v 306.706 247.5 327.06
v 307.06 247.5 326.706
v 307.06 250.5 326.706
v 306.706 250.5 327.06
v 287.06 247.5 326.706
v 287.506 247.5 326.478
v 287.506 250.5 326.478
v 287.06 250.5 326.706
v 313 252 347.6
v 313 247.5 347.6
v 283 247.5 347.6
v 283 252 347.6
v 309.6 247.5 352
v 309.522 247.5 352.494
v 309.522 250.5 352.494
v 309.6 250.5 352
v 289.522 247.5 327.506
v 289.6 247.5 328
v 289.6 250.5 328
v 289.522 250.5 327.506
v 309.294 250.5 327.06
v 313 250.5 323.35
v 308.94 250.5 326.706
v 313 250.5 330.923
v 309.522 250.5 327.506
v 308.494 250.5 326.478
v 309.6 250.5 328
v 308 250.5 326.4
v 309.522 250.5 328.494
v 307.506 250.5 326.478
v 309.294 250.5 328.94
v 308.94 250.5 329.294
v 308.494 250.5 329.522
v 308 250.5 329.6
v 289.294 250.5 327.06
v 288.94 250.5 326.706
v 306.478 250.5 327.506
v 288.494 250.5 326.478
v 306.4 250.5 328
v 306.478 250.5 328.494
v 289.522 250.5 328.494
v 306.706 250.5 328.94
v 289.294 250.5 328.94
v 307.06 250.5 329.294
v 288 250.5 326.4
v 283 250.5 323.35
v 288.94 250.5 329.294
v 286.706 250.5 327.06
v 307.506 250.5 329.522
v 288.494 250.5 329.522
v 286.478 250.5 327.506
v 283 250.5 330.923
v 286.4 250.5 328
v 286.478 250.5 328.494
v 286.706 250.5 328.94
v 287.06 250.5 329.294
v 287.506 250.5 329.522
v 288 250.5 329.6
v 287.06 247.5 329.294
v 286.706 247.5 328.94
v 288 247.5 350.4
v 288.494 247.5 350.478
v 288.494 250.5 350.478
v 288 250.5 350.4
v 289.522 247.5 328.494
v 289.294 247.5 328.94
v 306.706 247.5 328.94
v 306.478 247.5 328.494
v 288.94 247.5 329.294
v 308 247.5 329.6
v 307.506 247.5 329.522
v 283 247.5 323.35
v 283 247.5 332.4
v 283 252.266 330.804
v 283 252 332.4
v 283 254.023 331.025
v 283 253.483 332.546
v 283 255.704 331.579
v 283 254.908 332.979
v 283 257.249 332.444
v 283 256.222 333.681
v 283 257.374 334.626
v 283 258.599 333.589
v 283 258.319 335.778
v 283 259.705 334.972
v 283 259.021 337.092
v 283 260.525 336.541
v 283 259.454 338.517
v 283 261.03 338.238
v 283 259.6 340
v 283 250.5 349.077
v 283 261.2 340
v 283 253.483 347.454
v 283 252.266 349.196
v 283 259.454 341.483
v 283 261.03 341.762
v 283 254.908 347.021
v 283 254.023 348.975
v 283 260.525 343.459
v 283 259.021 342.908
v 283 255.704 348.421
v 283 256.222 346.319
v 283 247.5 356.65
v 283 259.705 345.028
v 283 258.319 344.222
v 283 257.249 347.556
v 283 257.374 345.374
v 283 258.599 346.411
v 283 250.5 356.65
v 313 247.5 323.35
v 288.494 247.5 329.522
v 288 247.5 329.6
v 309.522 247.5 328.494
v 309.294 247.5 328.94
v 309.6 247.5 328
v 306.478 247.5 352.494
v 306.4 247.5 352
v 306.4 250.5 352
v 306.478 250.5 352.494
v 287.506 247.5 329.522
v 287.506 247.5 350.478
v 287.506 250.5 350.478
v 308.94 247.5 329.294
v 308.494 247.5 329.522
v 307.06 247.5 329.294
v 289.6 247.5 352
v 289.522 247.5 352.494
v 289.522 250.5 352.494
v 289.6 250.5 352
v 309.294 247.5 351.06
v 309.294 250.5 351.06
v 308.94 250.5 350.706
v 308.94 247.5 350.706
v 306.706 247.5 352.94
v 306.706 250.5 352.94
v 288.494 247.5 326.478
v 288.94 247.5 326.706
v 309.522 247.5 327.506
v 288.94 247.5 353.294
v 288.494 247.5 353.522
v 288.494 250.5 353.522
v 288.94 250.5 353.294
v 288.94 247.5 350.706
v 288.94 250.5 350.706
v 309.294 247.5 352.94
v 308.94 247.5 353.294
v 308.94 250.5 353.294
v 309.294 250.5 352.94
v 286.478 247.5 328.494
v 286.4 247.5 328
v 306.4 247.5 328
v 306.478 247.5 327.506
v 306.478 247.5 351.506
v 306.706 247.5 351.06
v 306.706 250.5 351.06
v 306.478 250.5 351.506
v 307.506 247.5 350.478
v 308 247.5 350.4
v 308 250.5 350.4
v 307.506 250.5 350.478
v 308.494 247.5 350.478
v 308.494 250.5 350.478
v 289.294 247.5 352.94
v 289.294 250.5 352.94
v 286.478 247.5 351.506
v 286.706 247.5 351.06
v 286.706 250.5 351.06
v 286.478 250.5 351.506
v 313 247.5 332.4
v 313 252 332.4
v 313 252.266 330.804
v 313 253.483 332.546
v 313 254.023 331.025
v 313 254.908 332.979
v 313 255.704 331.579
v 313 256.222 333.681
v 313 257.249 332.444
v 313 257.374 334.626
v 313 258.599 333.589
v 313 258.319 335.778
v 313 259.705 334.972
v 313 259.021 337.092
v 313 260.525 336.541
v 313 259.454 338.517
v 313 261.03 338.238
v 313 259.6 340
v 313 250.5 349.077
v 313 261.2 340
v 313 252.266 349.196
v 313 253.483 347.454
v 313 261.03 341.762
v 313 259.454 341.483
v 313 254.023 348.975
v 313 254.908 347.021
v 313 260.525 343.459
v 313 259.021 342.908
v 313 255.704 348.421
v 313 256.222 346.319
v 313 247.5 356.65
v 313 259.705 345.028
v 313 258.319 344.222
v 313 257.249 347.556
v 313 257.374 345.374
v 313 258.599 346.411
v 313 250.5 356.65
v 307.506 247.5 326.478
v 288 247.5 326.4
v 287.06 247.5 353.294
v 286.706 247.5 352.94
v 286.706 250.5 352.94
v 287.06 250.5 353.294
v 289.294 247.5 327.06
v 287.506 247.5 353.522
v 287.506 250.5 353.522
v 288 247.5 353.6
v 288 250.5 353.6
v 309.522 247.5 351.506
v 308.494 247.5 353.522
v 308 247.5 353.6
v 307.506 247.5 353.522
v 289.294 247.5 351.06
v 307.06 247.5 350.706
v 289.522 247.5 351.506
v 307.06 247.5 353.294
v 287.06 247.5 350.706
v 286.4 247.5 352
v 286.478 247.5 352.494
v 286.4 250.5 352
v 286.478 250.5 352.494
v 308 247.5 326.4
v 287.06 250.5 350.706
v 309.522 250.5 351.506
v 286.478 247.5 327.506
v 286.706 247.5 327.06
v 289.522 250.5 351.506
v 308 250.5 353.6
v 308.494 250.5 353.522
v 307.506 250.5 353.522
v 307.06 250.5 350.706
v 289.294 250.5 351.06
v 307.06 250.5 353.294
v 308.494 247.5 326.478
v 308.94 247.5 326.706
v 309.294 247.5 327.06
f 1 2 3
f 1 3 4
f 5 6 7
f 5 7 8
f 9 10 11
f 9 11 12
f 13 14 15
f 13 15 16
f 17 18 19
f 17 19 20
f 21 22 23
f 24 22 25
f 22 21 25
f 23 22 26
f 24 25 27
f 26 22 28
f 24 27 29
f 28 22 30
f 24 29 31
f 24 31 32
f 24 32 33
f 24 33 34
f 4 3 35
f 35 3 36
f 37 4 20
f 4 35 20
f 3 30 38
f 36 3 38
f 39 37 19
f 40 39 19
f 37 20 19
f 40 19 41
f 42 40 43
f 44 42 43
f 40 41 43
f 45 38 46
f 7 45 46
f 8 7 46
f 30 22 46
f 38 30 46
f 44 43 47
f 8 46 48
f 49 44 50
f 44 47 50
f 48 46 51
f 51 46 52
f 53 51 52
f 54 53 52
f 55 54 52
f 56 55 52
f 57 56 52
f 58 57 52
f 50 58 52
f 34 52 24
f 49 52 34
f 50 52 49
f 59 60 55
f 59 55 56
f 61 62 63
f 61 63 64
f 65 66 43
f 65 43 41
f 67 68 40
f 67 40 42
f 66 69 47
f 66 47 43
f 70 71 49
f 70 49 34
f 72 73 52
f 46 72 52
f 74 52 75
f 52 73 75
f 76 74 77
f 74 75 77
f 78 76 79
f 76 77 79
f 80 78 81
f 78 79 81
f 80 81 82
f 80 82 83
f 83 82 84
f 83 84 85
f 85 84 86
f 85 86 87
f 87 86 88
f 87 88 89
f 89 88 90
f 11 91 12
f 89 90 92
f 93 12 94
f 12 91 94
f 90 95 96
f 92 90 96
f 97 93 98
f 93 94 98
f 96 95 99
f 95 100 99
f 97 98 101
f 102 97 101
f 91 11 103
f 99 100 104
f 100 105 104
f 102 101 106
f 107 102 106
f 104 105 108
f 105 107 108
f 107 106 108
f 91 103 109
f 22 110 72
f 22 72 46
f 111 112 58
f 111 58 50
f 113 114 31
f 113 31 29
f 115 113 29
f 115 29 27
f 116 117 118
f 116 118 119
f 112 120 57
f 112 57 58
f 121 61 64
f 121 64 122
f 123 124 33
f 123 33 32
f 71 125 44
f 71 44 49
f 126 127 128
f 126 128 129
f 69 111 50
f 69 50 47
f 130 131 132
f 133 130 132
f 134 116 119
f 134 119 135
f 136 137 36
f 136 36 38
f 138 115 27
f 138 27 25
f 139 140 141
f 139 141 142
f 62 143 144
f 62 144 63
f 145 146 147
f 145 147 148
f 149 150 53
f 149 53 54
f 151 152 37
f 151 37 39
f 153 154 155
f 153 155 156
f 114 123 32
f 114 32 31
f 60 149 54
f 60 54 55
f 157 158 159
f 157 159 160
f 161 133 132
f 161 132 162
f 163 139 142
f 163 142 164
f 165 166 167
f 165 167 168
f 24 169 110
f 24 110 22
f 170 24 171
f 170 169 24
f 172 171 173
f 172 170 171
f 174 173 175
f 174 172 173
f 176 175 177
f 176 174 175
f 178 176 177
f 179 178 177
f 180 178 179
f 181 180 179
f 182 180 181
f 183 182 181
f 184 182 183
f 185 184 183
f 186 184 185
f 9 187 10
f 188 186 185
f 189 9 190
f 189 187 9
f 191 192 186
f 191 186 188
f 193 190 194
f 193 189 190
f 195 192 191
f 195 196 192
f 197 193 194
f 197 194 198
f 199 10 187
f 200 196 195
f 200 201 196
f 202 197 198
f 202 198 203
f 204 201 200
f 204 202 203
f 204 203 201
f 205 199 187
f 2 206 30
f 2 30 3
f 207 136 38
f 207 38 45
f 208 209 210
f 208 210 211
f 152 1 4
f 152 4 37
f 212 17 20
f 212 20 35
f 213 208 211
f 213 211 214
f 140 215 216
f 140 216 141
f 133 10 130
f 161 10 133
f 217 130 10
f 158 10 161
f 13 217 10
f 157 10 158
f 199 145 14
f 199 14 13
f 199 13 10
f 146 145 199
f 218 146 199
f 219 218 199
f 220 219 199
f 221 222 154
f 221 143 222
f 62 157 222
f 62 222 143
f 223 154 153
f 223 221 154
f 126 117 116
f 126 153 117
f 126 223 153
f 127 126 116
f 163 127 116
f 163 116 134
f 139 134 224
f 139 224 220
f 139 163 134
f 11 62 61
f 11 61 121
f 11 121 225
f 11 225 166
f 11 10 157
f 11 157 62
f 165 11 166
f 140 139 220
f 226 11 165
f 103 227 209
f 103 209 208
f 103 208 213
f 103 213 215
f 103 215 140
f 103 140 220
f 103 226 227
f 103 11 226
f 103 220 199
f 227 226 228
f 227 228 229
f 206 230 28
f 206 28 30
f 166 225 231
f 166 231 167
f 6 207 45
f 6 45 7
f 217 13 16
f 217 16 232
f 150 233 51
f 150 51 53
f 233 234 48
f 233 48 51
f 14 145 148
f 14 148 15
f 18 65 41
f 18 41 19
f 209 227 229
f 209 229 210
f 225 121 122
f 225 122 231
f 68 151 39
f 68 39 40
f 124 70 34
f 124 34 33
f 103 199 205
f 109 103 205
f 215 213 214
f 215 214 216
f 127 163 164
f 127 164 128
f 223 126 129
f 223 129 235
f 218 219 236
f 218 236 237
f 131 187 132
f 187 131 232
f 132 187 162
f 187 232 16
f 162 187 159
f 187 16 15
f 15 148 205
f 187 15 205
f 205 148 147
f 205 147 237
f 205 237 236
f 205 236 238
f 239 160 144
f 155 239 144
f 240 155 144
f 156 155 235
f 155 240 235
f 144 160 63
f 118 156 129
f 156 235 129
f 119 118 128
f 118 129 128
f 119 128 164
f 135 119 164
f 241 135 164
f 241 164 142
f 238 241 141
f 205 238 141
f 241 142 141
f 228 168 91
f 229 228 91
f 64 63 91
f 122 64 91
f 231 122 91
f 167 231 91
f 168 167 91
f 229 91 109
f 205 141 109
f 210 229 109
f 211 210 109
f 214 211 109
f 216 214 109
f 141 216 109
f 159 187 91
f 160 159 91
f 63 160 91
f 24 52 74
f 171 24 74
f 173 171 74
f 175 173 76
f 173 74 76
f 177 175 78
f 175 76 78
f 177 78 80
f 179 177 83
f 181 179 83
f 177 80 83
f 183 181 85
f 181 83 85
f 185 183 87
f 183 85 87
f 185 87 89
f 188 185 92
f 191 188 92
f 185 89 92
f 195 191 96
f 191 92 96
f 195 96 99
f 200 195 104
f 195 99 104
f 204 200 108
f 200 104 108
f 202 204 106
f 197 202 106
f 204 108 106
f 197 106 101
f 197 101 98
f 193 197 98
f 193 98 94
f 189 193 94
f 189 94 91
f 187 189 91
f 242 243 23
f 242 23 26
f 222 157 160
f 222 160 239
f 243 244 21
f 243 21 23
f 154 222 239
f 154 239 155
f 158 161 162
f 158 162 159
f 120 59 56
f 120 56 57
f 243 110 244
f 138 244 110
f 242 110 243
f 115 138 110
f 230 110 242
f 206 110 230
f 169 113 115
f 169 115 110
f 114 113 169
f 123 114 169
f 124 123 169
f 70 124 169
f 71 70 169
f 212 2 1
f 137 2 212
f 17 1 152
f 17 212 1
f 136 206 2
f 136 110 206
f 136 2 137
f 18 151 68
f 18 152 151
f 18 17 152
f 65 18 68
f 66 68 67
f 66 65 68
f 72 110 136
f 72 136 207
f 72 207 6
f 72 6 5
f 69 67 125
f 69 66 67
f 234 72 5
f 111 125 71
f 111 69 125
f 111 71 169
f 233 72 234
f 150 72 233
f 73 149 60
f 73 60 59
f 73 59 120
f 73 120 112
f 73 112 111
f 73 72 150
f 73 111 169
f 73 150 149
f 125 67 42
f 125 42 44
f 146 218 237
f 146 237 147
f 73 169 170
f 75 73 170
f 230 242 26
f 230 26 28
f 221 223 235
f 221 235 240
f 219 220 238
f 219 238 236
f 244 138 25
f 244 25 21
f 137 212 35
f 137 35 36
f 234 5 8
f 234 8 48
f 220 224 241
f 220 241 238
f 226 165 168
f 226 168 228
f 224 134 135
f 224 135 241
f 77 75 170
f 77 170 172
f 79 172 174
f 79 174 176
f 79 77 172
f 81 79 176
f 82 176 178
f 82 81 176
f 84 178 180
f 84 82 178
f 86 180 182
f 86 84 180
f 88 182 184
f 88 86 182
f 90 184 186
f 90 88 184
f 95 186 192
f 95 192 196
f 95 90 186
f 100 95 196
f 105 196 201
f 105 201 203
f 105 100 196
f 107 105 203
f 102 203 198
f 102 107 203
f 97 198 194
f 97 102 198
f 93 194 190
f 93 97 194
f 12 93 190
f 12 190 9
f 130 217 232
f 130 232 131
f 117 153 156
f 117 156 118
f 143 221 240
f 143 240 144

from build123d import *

# Parameters (mm, degrees)
PRISM070_DEPTH                = 10
PRISM070_PITCH_ANGLE          = 90
PRISM071_DEPTH                = 10
PRISM071_PITCH_ANGLE          = 90
PRISM072_DEPTH                = 10
PRISM072_PITCH_ANGLE          = 90
PRISM073_DEPTH                = 10
PRISM073_PITCH_ANGLE          = 90
CUBE082_W                     = 5
CUBE082_H                     = 35
CUBE082_DEPTH                 = 32
CUBE081_W                     = 16
CUBE081_H                     = 15.2
CUBE081_DEPTH                 = 30
CUBE077_W                     = 3
CUBE077_H                     = 11.7
CUBE077_DEPTH                 = 30
CUBE078_W                     = 3
CUBE078_H                     = 11.7
CUBE078_DEPTH                 = 30
CUBE079_W                     = 1.6
CUBE079_H                     = 1.6
CUBE079_DEPTH                 = 30
CUBE080_W                     = 1.6
CUBE080_H                     = 1.6
CUBE080_DEPTH                 = 30
CYLINDER021_R                 = 7.6
CYLINDER021_DEPTH             = 30
CYLINDER020_R                 = 9.2
CYLINDER020_DEPTH             = 30
DIFFERENCE050_ROLL_ANGLE      = 90
DIFFERENCE050_PLACEMENT_ANGLE = 90


with BuildPart() as prism070:
    # prism070 → prism070 (new body)
    with BuildSketch(Plane.XY):
        Polygon((1.6, 0), (1.52169, 0.494427), (1.294427, 0.940456), (0.940456, 1.294427), (0.494427, 1.52169), (0, 1.6), (-0.494427, 1.52169), (-0.940456, 1.294427), (-1.294427, 0.940456), (-1.52169, 0.494427), (-1.6, 0), (-1.52169, -0.494427), (-1.294427, -0.940456), (-0.940456, -1.294427), (-0.494427, -1.52169), (0, -1.6), (0.494427, -1.52169), (0.940456, -1.294427), (1.294427, -0.940456), (1.52169, -0.494427), align=None)
    extrude(amount=PRISM070_DEPTH)


with BuildPart() as prism070_1:
    # prism070 pitch: moved
    add(prism070.part.rotate(Axis((0, 0, 0), (0, 1, 0)), PRISM070_PITCH_ANGLE))


with BuildPart() as prism070_2:
    # prism070 placement: moved
    add(prism070_1.part.moved(Location((-10, 12, 10))))


with BuildPart() as prism071:
    # prism071 → prism071 (new body)
    with BuildSketch(Plane.XY):
        Polygon((1.6, 0), (1.52169, 0.494427), (1.294427, 0.940456), (0.940456, 1.294427), (0.494427, 1.52169), (0, 1.6), (-0.494427, 1.52169), (-0.940456, 1.294427), (-1.294427, 0.940456), (-1.52169, 0.494427), (-1.6, 0), (-1.52169, -0.494427), (-1.294427, -0.940456), (-0.940456, -1.294427), (-0.494427, -1.52169), (0, -1.6), (0.494427, -1.52169), (0.940456, -1.294427), (1.294427, -0.940456), (1.52169, -0.494427), align=None)
    extrude(amount=PRISM071_DEPTH)


with BuildPart() as prism071_1:
    # prism071 pitch: moved
    add(prism071.part.rotate(Axis((0, 0, 0), (0, 1, 0)), PRISM071_PITCH_ANGLE))


with BuildPart() as prism071_2:
    # prism071 placement: moved
    add(prism071_1.part.moved(Location((-10, 12, -10))))


with BuildPart() as prism072:
    # prism072 → prism072 (new body)
    with BuildSketch(Plane.XY):
        Polygon((1.6, 0), (1.52169, 0.494427), (1.294427, 0.940456), (0.940456, 1.294427), (0.494427, 1.52169), (0, 1.6), (-0.494427, 1.52169), (-0.940456, 1.294427), (-1.294427, 0.940456), (-1.52169, 0.494427), (-1.6, 0), (-1.52169, -0.494427), (-1.294427, -0.940456), (-0.940456, -1.294427), (-0.494427, -1.52169), (0, -1.6), (0.494427, -1.52169), (0.940456, -1.294427), (1.294427, -0.940456), (1.52169, -0.494427), align=None)
    extrude(amount=PRISM072_DEPTH)


with BuildPart() as prism072_1:
    # prism072 pitch: moved
    add(prism072.part.rotate(Axis((0, 0, 0), (0, 1, 0)), PRISM072_PITCH_ANGLE))


with BuildPart() as prism072_2:
    # prism072 placement: moved
    add(prism072_1.part.moved(Location((-10, -12, 10))))


with BuildPart() as prism073:
    # prism073 → prism073 (new body)
    with BuildSketch(Plane.XY):
        Polygon((1.6, 0), (1.52169, 0.494427), (1.294427, 0.940456), (0.940456, 1.294427), (0.494427, 1.52169), (0, 1.6), (-0.494427, 1.52169), (-0.940456, 1.294427), (-1.294427, 0.940456), (-1.52169, 0.494427), (-1.6, 0), (-1.52169, -0.494427), (-1.294427, -0.940456), (-0.940456, -1.294427), (-0.494427, -1.52169), (0, -1.6), (0.494427, -1.52169), (0.940456, -1.294427), (1.294427, -0.940456), (1.52169, -0.494427), align=None)
    extrude(amount=PRISM073_DEPTH)


with BuildPart() as prism073_1:
    # prism073 pitch: moved
    add(prism073.part.rotate(Axis((0, 0, 0), (0, 1, 0)), PRISM073_PITCH_ANGLE))


with BuildPart() as prism073_2:
    # prism073 placement: moved
    add(prism073_1.part.moved(Location((-10, -12, -10))))


with BuildPart() as cube082:
    # cube082 → cube082 (new body)
    with BuildSketch(Plane(origin=(-9.5, -17.5, -16), x_dir=(1, 0, 0), z_dir=(0, 0, 1))):
        with Locations((2.5, 17.5)):
            Rectangle(CUBE082_W, CUBE082_H)
    extrude(amount=CUBE082_DEPTH)


with BuildPart() as union038:
    # cube081 → cube081 (new body)
    with BuildSketch(Plane(origin=(-16, -7.6, -15), x_dir=(1, 0, 0), z_dir=(0, 0, 1))):
        with Locations((8, 7.6)):
            Rectangle(CUBE081_W, CUBE081_H)
    extrude(amount=CUBE081_DEPTH)

    # union038: union prism070, prism071, prism072, prism073, cube082
    add(prism070_2.part)
    add(prism071_2.part)
    add(prism072_2.part)
    add(prism073_2.part)
    add(cube082.part)


with BuildPart() as cube077:
    # cube077 → cube077 (new body)
    with BuildSketch(Plane(origin=(-4.5, 4.95, -15), x_dir=(1, 0, 0), z_dir=(0, 0, 1))):
        with Locations((1.5, 5.85)):
            Rectangle(CUBE077_W, CUBE077_H)
    extrude(amount=CUBE077_DEPTH)


with BuildPart() as cube078:
    # cube078 → cube078 (new body)
    with BuildSketch(Plane(origin=(-4.5, -16.65, -15), x_dir=(1, 0, 0), z_dir=(0, 0, 1))):
        with Locations((1.5, 5.85)):
            Rectangle(CUBE078_W, CUBE078_H)
    extrude(amount=CUBE078_DEPTH)


with BuildPart() as cube079:
    # cube079 → cube079 (new body)
    with BuildSketch(Plane(origin=(-4.6, 7.5, -15), x_dir=(1, 0, 0), z_dir=(0, 0, 1))):
        with Locations((0.8, 0.8)):
            Rectangle(CUBE079_W, CUBE079_H)
    extrude(amount=CUBE079_DEPTH)


with BuildPart() as cube080:
    # cube080 → cube080 (new body)
    with BuildSketch(Plane(origin=(-4.6, -9.1, -15), x_dir=(1, 0, 0), z_dir=(0, 0, 1))):
        with Locations((0.8, 0.8)):
            Rectangle(CUBE080_W, CUBE080_H)
    extrude(amount=CUBE080_DEPTH)


with BuildPart() as cylinder021:
    # cylinder021 → cylinder021 (new body)
    with BuildSketch(Plane.XY.offset(-15)):
        Circle(CYLINDER021_R)
    extrude(amount=CYLINDER021_DEPTH)


with BuildPart() as difference050:
    # cylinder020 → cylinder020 (new body)
    with BuildSketch(Plane.XY.offset(-15)):
        Circle(CYLINDER020_R)
    extrude(amount=CYLINDER020_DEPTH)

    # difference049: cut cylinder021
    add(cylinder021.part, mode=Mode.SUBTRACT)

    # union037: union cube077, cube078, cube079, cube080
    add(cube077.part)
    add(cube078.part)
    add(cube079.part)
    add(cube080.part)

    # difference050: cut union038
    add(union038.part, mode=Mode.SUBTRACT)


with BuildPart() as difference050_1:
    # difference050 roll: moved
    add(difference050.part.rotate(Axis((0, 0, 0), (1, 0, 0)), DIFFERENCE050_ROLL_ANGLE))


with BuildPart() as difference050_2:
    # difference050 placement: moved
    add(difference050_1.part.moved(Location((298, 252, 340))).rotate(Axis((298, 252, 340), (0, 0, 1)), DIFFERENCE050_PLACEMENT_ANGLE))


solid = difference050_2.part
